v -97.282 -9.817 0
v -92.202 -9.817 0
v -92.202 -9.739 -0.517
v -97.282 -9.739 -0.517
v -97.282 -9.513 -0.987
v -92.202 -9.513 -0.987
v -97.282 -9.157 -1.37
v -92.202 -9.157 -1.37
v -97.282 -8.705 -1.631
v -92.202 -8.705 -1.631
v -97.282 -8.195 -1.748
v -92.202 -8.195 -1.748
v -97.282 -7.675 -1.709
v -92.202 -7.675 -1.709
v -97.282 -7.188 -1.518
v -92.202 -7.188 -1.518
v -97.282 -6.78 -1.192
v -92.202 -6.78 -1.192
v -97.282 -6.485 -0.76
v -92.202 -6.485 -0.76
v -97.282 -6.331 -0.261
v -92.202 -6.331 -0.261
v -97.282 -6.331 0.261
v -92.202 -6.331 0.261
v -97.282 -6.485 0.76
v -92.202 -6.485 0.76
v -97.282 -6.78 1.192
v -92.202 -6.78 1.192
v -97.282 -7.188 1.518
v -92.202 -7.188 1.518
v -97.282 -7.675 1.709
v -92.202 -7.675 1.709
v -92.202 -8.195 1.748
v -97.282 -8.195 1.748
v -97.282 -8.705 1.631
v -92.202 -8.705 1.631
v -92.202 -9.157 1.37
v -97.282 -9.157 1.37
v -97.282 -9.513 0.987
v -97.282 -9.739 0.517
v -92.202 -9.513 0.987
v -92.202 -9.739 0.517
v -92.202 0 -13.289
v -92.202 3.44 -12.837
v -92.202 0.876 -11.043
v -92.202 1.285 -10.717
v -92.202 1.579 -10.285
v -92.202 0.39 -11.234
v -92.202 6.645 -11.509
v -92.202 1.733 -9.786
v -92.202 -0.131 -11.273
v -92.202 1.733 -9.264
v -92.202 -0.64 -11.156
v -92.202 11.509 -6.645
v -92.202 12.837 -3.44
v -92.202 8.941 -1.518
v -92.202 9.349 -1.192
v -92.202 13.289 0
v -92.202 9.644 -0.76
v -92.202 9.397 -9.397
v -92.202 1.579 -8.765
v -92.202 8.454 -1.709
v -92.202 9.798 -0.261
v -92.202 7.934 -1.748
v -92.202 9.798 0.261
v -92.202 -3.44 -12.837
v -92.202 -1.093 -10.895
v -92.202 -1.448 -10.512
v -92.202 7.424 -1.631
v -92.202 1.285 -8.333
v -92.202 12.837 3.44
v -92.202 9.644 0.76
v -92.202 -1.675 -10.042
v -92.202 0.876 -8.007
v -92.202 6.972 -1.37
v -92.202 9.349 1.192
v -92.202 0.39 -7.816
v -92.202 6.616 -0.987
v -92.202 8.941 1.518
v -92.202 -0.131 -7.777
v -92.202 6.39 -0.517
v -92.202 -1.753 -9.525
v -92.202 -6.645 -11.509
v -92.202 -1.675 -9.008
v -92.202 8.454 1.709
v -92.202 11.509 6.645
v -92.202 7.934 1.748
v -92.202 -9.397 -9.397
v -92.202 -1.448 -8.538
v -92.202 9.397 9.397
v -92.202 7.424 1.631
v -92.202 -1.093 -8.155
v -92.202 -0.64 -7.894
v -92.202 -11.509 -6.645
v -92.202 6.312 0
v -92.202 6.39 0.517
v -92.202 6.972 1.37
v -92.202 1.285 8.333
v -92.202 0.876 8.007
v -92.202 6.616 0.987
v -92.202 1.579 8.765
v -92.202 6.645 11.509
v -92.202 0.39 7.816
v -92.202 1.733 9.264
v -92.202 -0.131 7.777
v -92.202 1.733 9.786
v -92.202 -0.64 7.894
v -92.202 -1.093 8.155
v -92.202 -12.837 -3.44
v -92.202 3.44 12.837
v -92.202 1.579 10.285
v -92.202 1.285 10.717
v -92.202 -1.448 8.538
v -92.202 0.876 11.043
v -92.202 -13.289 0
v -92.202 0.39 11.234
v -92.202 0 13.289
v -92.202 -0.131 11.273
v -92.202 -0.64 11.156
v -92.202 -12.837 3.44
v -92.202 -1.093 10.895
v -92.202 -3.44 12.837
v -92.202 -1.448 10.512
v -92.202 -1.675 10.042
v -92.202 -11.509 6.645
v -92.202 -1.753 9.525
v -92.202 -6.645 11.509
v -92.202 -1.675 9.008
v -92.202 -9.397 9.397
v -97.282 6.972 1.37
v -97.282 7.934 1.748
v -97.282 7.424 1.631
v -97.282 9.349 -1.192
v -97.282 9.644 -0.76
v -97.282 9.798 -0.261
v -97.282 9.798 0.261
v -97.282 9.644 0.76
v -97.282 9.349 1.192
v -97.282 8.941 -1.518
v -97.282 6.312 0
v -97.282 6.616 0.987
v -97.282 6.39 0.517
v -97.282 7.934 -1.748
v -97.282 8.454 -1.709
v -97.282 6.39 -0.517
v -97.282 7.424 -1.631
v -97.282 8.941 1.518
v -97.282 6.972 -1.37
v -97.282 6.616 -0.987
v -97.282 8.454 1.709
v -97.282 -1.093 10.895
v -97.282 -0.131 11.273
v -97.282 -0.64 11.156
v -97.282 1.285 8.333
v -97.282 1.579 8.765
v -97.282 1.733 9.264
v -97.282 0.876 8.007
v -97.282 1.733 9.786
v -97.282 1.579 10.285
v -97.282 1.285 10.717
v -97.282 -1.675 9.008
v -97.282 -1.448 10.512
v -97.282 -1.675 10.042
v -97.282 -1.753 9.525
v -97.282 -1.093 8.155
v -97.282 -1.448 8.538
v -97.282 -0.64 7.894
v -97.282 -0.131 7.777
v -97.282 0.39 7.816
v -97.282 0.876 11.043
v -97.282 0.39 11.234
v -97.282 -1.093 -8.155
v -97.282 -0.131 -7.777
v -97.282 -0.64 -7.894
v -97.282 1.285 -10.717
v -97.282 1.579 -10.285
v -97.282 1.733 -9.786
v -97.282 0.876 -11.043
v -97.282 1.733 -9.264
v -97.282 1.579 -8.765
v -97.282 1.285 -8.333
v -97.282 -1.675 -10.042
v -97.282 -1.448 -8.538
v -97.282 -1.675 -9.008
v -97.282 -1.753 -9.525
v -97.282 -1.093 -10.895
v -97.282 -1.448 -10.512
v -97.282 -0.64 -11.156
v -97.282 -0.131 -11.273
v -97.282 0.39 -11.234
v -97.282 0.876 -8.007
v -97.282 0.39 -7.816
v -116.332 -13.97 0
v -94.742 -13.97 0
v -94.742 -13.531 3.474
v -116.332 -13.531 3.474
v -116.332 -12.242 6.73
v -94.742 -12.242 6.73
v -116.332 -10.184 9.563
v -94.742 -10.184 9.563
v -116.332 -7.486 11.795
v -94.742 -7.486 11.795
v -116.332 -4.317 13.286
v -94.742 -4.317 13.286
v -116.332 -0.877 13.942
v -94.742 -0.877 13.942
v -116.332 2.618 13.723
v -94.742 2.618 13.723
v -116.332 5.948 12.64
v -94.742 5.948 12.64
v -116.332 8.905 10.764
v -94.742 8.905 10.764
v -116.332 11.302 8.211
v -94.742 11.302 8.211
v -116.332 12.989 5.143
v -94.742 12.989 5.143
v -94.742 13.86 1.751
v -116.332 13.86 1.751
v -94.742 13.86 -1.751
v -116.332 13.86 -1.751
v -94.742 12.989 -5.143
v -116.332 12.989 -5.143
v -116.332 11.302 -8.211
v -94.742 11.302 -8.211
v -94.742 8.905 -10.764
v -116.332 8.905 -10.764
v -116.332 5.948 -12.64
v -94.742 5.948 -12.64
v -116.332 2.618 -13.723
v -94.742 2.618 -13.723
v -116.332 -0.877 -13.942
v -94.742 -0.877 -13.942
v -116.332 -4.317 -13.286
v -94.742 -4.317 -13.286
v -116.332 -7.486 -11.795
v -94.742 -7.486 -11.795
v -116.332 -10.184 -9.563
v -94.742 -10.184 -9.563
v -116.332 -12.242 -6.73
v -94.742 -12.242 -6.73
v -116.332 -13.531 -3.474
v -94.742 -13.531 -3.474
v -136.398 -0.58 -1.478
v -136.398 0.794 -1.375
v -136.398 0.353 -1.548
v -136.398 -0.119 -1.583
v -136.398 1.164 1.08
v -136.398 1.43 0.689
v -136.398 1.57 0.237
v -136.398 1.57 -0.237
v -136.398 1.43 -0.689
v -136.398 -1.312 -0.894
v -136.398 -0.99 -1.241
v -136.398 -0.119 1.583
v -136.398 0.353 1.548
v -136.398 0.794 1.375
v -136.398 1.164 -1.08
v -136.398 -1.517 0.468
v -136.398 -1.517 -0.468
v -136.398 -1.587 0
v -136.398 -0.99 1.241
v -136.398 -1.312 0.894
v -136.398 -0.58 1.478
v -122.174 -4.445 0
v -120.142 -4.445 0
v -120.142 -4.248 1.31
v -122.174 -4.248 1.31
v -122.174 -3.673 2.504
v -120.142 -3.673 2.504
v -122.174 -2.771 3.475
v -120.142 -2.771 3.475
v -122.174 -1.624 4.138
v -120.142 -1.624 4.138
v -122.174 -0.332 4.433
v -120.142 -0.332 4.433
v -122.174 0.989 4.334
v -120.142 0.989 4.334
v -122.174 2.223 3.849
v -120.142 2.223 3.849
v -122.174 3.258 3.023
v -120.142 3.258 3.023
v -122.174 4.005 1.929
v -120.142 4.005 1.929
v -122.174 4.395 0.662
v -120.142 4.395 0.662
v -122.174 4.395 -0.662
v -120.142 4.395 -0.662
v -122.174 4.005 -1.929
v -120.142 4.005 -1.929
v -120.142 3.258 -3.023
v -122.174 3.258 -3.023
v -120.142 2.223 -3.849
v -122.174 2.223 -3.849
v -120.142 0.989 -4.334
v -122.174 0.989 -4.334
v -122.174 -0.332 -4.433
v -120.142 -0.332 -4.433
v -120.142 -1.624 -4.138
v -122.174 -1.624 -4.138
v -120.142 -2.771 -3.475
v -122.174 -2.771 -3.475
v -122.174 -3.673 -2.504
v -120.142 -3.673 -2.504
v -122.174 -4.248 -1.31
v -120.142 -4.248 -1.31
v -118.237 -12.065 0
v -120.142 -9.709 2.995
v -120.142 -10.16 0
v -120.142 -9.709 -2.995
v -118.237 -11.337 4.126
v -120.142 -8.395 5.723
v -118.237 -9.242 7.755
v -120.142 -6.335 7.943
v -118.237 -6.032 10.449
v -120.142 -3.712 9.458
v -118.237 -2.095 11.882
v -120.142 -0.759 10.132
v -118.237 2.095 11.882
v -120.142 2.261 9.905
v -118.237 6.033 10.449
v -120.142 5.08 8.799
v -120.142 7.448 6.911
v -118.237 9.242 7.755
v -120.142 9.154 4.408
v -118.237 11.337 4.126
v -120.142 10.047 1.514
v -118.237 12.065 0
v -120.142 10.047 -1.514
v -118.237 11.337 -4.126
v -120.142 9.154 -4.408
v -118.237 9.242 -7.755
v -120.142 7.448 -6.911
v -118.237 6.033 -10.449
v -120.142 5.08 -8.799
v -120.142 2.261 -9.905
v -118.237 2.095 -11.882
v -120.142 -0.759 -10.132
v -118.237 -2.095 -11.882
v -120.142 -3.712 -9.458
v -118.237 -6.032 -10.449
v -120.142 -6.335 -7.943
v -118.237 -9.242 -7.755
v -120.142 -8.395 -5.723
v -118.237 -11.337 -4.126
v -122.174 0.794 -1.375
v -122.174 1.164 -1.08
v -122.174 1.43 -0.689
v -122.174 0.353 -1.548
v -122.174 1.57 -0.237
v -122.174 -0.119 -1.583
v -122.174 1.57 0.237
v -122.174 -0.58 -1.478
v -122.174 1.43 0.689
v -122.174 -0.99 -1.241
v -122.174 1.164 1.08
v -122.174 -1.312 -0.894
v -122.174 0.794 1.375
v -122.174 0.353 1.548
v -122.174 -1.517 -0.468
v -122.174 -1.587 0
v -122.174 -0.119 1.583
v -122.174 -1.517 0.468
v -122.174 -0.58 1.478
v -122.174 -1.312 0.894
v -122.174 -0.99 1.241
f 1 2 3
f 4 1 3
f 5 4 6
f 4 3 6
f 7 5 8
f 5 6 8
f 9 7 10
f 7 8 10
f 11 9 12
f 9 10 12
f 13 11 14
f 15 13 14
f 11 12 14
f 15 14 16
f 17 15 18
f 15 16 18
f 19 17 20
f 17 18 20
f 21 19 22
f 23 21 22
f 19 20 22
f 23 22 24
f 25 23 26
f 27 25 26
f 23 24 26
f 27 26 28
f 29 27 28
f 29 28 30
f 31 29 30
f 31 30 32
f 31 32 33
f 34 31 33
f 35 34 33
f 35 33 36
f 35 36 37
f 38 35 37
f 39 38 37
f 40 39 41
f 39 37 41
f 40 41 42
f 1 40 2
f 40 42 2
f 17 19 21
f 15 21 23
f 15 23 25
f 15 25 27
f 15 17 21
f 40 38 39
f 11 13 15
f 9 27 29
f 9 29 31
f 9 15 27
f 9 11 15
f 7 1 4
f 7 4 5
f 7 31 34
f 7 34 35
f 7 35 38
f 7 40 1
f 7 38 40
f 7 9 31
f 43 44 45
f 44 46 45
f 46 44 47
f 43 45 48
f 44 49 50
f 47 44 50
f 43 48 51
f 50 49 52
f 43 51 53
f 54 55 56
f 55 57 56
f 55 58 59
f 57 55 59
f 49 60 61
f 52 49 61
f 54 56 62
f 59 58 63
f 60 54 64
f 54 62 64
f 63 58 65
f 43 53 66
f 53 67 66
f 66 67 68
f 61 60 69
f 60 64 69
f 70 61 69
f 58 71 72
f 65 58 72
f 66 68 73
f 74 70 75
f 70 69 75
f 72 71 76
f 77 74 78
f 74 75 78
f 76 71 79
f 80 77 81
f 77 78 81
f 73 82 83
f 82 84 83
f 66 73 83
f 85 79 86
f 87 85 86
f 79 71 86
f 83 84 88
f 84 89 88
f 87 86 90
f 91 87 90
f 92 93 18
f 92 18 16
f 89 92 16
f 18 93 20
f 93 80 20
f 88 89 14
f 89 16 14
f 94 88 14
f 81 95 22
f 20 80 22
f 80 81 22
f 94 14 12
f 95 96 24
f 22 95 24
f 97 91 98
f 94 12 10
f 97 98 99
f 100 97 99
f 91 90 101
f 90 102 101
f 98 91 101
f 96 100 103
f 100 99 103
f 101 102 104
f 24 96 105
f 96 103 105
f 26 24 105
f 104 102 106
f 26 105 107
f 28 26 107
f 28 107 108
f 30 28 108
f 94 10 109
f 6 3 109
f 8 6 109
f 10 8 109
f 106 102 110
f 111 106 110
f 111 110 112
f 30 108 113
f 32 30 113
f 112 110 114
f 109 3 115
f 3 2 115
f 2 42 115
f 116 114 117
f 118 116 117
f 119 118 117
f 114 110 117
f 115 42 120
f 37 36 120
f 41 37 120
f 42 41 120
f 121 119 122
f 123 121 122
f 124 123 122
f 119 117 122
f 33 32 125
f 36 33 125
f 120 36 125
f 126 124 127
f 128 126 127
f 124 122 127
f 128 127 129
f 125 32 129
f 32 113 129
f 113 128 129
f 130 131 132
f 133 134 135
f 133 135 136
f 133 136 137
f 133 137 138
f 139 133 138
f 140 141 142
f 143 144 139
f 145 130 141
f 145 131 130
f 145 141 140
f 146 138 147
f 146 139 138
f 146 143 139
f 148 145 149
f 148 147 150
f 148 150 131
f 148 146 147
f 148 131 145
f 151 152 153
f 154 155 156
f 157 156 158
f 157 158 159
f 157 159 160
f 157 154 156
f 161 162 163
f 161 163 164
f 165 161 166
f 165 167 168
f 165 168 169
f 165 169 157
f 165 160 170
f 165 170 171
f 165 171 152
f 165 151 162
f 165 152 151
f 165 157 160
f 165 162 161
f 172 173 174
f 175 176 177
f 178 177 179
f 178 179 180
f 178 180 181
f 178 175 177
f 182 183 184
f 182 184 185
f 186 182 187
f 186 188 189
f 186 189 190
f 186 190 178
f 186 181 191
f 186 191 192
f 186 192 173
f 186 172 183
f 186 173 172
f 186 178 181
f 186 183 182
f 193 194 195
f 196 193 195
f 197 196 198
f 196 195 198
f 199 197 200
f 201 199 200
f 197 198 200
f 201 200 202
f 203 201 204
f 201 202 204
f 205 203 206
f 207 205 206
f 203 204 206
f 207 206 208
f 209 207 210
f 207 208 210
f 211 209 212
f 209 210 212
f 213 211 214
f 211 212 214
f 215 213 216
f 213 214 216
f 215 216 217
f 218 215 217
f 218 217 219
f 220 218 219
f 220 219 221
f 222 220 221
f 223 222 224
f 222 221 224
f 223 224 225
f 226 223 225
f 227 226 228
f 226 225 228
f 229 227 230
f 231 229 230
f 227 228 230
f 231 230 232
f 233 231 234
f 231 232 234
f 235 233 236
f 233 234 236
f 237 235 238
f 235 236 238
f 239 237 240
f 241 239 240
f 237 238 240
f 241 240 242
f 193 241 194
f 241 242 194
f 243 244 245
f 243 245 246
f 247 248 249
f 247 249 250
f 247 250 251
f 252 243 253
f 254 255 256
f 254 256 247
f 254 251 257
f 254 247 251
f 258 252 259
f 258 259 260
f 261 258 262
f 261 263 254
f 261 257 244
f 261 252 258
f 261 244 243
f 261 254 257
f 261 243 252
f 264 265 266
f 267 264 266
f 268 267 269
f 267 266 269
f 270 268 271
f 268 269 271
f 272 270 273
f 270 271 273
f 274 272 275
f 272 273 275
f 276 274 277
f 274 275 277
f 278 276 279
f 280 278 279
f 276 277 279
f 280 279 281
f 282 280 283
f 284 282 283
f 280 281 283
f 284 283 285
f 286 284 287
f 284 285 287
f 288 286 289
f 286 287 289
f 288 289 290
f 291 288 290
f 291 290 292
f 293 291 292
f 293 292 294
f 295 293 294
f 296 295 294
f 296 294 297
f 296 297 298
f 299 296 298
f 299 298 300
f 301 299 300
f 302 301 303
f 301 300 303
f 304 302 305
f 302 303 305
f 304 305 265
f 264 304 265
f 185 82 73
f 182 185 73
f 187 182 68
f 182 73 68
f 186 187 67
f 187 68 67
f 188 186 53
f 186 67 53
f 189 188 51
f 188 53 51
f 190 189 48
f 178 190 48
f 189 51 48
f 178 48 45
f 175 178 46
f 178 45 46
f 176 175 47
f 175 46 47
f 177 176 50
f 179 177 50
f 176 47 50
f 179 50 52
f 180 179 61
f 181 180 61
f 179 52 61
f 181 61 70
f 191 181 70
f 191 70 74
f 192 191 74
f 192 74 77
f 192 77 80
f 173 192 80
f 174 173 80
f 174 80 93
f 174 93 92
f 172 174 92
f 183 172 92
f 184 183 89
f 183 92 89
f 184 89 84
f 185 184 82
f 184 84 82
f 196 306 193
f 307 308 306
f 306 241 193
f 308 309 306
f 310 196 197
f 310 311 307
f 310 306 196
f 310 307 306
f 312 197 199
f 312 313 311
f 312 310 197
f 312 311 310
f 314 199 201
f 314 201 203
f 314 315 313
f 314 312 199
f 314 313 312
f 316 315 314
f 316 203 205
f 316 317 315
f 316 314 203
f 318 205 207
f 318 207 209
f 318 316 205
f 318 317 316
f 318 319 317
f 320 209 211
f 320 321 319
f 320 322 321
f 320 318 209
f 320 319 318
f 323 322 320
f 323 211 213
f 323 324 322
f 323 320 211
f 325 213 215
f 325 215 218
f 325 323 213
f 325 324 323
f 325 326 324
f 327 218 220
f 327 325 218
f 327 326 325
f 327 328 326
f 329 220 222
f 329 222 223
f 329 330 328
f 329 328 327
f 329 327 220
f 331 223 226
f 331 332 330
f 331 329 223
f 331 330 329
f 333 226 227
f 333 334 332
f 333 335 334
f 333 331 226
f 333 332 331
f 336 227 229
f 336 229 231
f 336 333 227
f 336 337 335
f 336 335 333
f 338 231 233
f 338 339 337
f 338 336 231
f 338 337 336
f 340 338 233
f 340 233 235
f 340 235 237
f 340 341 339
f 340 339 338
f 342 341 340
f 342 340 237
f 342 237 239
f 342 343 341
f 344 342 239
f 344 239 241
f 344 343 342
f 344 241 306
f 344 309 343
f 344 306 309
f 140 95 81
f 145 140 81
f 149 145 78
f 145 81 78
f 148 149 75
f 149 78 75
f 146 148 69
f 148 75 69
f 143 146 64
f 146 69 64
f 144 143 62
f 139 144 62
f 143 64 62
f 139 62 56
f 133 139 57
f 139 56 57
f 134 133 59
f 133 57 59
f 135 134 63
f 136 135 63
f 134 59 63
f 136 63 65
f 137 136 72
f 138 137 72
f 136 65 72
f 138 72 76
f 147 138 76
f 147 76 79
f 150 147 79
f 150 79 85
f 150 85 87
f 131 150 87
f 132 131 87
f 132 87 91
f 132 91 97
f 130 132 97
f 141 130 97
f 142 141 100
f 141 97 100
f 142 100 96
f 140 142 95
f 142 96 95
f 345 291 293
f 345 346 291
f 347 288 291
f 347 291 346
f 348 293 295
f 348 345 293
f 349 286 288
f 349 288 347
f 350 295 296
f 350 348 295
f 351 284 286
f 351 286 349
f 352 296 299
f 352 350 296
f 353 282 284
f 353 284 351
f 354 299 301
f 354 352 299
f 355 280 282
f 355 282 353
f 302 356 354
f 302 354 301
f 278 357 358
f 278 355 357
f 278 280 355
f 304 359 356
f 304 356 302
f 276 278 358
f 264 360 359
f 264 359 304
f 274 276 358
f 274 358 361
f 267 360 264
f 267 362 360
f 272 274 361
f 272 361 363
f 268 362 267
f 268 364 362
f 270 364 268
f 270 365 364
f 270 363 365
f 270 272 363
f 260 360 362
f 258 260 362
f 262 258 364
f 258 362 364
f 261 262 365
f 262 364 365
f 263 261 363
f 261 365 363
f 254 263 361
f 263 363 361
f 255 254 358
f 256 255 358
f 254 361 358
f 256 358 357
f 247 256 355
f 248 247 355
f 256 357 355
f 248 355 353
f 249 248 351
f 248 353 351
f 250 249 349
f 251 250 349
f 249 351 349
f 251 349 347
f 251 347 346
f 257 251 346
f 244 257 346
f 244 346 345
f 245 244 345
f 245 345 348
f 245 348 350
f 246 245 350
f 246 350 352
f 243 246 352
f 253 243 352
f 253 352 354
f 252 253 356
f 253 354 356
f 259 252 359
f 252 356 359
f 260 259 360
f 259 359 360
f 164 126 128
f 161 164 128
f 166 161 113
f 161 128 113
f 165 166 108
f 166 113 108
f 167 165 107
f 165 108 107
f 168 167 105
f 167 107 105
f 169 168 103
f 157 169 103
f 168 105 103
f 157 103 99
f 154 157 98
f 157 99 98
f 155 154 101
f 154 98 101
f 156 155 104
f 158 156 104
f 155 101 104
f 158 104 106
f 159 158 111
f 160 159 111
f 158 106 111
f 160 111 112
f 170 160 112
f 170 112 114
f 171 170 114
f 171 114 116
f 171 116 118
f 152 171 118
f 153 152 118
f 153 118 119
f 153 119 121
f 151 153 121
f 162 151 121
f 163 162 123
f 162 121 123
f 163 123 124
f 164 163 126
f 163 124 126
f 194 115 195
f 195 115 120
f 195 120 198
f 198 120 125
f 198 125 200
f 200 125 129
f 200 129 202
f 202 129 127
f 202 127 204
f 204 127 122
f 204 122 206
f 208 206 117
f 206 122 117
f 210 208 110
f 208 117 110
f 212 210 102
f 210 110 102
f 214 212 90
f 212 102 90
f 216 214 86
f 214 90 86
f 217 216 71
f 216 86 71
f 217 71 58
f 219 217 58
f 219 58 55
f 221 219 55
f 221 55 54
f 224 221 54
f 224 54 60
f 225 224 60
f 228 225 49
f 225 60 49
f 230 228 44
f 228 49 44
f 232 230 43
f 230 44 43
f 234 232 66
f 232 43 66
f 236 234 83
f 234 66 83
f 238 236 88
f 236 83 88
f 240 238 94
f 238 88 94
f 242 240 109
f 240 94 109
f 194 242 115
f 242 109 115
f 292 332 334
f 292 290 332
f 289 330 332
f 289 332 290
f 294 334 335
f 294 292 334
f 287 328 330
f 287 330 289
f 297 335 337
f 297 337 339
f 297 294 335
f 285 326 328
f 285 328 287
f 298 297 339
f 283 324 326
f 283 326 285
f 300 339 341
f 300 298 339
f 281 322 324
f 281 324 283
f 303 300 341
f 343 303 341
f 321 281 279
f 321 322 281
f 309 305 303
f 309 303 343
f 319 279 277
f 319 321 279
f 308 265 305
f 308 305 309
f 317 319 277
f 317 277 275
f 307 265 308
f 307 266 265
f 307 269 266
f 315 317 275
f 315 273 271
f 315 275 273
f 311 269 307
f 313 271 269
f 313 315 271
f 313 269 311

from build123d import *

# Parameters (mm, degrees)
SKETCH072_R             = 13.97
PAD035_DEPTH            = 27.94
CHAMFER_ANGLE           = 15
CHAMFER_SIZE            = 2.54
CHAMFER001_SIZE         = 3.81
SKETCH073_R             = 4.445
PAD036_DEPTH            = 2.032
SKETCH074_R             = 1.5875
PAD037_DEPTH            = 14.224
SKETCH099_R             = 1.7526
POCKET026_DEPTH         = 5.08
BODY028_PLACEMENT_ANGLE = 180


with BuildPart() as part:
    # Sketch072 → Pad035 (new body)
    with BuildSketch(Plane.YZ):
        Circle(SKETCH072_R)
    extrude(amount=PAD035_DEPTH)

    # Chamfer
    chamfer_edges = [part.edges().sort_by_distance(p)[0] for p in [
        (0, -13.97, 0),
    ]]
    chamfer_side = part.faces().sort_by_distance((13.97, -13.97, 0))[0]
    chamfer(chamfer_edges, length=CHAMFER_SIZE, angle=CHAMFER_ANGLE, reference=chamfer_side)

    # Chamfer001
    chamfer001_edges = [part.edges().sort_by_distance(p)[0] for p in [
        (27.94, -13.97, 0),
    ]]
    chamfer(chamfer001_edges, length=CHAMFER001_SIZE)

    # Sketch073 (on Face4 of Chamfer001) → Pad036 (join)
    with BuildSketch(Plane.YZ.offset(27.94)):
        Circle(SKETCH073_R)
    extrude(amount=PAD036_DEPTH)

    # Sketch074 (on Face7 of Pad036) → Pad037 (join)
    with BuildSketch(Plane.YZ.offset(29.972)):
        Circle(SKETCH074_R)
    extrude(amount=PAD037_DEPTH)

    # Sketch099 (on Face5 of Pad037) → Pocket026 (cut)
    with BuildSketch(Plane(origin=(0, 0, 0), x_dir=(0, 1, 0), z_dir=(-1, 0, 0))):
        with Locations((0, 9.525)):
            Circle(SKETCH099_R)
        with Locations((8.0645, 0)):
            Circle(SKETCH099_R)
        with Locations((0, -9.525)):
            Circle(SKETCH099_R)
        with Locations((-8.0645, 0)):
            Circle(SKETCH099_R)
    extrude(amount=-POCKET026_DEPTH, mode=Mode.SUBTRACT)


with BuildPart() as part_1:
    # Body028 placement: moved
    add(part.part.moved(Location((-92.202, 0, 0))).rotate(Axis((-92.202, 0, 0), (0, 0, 1)), BODY028_PLACEMENT_ANGLE))


solid = part_1.part
